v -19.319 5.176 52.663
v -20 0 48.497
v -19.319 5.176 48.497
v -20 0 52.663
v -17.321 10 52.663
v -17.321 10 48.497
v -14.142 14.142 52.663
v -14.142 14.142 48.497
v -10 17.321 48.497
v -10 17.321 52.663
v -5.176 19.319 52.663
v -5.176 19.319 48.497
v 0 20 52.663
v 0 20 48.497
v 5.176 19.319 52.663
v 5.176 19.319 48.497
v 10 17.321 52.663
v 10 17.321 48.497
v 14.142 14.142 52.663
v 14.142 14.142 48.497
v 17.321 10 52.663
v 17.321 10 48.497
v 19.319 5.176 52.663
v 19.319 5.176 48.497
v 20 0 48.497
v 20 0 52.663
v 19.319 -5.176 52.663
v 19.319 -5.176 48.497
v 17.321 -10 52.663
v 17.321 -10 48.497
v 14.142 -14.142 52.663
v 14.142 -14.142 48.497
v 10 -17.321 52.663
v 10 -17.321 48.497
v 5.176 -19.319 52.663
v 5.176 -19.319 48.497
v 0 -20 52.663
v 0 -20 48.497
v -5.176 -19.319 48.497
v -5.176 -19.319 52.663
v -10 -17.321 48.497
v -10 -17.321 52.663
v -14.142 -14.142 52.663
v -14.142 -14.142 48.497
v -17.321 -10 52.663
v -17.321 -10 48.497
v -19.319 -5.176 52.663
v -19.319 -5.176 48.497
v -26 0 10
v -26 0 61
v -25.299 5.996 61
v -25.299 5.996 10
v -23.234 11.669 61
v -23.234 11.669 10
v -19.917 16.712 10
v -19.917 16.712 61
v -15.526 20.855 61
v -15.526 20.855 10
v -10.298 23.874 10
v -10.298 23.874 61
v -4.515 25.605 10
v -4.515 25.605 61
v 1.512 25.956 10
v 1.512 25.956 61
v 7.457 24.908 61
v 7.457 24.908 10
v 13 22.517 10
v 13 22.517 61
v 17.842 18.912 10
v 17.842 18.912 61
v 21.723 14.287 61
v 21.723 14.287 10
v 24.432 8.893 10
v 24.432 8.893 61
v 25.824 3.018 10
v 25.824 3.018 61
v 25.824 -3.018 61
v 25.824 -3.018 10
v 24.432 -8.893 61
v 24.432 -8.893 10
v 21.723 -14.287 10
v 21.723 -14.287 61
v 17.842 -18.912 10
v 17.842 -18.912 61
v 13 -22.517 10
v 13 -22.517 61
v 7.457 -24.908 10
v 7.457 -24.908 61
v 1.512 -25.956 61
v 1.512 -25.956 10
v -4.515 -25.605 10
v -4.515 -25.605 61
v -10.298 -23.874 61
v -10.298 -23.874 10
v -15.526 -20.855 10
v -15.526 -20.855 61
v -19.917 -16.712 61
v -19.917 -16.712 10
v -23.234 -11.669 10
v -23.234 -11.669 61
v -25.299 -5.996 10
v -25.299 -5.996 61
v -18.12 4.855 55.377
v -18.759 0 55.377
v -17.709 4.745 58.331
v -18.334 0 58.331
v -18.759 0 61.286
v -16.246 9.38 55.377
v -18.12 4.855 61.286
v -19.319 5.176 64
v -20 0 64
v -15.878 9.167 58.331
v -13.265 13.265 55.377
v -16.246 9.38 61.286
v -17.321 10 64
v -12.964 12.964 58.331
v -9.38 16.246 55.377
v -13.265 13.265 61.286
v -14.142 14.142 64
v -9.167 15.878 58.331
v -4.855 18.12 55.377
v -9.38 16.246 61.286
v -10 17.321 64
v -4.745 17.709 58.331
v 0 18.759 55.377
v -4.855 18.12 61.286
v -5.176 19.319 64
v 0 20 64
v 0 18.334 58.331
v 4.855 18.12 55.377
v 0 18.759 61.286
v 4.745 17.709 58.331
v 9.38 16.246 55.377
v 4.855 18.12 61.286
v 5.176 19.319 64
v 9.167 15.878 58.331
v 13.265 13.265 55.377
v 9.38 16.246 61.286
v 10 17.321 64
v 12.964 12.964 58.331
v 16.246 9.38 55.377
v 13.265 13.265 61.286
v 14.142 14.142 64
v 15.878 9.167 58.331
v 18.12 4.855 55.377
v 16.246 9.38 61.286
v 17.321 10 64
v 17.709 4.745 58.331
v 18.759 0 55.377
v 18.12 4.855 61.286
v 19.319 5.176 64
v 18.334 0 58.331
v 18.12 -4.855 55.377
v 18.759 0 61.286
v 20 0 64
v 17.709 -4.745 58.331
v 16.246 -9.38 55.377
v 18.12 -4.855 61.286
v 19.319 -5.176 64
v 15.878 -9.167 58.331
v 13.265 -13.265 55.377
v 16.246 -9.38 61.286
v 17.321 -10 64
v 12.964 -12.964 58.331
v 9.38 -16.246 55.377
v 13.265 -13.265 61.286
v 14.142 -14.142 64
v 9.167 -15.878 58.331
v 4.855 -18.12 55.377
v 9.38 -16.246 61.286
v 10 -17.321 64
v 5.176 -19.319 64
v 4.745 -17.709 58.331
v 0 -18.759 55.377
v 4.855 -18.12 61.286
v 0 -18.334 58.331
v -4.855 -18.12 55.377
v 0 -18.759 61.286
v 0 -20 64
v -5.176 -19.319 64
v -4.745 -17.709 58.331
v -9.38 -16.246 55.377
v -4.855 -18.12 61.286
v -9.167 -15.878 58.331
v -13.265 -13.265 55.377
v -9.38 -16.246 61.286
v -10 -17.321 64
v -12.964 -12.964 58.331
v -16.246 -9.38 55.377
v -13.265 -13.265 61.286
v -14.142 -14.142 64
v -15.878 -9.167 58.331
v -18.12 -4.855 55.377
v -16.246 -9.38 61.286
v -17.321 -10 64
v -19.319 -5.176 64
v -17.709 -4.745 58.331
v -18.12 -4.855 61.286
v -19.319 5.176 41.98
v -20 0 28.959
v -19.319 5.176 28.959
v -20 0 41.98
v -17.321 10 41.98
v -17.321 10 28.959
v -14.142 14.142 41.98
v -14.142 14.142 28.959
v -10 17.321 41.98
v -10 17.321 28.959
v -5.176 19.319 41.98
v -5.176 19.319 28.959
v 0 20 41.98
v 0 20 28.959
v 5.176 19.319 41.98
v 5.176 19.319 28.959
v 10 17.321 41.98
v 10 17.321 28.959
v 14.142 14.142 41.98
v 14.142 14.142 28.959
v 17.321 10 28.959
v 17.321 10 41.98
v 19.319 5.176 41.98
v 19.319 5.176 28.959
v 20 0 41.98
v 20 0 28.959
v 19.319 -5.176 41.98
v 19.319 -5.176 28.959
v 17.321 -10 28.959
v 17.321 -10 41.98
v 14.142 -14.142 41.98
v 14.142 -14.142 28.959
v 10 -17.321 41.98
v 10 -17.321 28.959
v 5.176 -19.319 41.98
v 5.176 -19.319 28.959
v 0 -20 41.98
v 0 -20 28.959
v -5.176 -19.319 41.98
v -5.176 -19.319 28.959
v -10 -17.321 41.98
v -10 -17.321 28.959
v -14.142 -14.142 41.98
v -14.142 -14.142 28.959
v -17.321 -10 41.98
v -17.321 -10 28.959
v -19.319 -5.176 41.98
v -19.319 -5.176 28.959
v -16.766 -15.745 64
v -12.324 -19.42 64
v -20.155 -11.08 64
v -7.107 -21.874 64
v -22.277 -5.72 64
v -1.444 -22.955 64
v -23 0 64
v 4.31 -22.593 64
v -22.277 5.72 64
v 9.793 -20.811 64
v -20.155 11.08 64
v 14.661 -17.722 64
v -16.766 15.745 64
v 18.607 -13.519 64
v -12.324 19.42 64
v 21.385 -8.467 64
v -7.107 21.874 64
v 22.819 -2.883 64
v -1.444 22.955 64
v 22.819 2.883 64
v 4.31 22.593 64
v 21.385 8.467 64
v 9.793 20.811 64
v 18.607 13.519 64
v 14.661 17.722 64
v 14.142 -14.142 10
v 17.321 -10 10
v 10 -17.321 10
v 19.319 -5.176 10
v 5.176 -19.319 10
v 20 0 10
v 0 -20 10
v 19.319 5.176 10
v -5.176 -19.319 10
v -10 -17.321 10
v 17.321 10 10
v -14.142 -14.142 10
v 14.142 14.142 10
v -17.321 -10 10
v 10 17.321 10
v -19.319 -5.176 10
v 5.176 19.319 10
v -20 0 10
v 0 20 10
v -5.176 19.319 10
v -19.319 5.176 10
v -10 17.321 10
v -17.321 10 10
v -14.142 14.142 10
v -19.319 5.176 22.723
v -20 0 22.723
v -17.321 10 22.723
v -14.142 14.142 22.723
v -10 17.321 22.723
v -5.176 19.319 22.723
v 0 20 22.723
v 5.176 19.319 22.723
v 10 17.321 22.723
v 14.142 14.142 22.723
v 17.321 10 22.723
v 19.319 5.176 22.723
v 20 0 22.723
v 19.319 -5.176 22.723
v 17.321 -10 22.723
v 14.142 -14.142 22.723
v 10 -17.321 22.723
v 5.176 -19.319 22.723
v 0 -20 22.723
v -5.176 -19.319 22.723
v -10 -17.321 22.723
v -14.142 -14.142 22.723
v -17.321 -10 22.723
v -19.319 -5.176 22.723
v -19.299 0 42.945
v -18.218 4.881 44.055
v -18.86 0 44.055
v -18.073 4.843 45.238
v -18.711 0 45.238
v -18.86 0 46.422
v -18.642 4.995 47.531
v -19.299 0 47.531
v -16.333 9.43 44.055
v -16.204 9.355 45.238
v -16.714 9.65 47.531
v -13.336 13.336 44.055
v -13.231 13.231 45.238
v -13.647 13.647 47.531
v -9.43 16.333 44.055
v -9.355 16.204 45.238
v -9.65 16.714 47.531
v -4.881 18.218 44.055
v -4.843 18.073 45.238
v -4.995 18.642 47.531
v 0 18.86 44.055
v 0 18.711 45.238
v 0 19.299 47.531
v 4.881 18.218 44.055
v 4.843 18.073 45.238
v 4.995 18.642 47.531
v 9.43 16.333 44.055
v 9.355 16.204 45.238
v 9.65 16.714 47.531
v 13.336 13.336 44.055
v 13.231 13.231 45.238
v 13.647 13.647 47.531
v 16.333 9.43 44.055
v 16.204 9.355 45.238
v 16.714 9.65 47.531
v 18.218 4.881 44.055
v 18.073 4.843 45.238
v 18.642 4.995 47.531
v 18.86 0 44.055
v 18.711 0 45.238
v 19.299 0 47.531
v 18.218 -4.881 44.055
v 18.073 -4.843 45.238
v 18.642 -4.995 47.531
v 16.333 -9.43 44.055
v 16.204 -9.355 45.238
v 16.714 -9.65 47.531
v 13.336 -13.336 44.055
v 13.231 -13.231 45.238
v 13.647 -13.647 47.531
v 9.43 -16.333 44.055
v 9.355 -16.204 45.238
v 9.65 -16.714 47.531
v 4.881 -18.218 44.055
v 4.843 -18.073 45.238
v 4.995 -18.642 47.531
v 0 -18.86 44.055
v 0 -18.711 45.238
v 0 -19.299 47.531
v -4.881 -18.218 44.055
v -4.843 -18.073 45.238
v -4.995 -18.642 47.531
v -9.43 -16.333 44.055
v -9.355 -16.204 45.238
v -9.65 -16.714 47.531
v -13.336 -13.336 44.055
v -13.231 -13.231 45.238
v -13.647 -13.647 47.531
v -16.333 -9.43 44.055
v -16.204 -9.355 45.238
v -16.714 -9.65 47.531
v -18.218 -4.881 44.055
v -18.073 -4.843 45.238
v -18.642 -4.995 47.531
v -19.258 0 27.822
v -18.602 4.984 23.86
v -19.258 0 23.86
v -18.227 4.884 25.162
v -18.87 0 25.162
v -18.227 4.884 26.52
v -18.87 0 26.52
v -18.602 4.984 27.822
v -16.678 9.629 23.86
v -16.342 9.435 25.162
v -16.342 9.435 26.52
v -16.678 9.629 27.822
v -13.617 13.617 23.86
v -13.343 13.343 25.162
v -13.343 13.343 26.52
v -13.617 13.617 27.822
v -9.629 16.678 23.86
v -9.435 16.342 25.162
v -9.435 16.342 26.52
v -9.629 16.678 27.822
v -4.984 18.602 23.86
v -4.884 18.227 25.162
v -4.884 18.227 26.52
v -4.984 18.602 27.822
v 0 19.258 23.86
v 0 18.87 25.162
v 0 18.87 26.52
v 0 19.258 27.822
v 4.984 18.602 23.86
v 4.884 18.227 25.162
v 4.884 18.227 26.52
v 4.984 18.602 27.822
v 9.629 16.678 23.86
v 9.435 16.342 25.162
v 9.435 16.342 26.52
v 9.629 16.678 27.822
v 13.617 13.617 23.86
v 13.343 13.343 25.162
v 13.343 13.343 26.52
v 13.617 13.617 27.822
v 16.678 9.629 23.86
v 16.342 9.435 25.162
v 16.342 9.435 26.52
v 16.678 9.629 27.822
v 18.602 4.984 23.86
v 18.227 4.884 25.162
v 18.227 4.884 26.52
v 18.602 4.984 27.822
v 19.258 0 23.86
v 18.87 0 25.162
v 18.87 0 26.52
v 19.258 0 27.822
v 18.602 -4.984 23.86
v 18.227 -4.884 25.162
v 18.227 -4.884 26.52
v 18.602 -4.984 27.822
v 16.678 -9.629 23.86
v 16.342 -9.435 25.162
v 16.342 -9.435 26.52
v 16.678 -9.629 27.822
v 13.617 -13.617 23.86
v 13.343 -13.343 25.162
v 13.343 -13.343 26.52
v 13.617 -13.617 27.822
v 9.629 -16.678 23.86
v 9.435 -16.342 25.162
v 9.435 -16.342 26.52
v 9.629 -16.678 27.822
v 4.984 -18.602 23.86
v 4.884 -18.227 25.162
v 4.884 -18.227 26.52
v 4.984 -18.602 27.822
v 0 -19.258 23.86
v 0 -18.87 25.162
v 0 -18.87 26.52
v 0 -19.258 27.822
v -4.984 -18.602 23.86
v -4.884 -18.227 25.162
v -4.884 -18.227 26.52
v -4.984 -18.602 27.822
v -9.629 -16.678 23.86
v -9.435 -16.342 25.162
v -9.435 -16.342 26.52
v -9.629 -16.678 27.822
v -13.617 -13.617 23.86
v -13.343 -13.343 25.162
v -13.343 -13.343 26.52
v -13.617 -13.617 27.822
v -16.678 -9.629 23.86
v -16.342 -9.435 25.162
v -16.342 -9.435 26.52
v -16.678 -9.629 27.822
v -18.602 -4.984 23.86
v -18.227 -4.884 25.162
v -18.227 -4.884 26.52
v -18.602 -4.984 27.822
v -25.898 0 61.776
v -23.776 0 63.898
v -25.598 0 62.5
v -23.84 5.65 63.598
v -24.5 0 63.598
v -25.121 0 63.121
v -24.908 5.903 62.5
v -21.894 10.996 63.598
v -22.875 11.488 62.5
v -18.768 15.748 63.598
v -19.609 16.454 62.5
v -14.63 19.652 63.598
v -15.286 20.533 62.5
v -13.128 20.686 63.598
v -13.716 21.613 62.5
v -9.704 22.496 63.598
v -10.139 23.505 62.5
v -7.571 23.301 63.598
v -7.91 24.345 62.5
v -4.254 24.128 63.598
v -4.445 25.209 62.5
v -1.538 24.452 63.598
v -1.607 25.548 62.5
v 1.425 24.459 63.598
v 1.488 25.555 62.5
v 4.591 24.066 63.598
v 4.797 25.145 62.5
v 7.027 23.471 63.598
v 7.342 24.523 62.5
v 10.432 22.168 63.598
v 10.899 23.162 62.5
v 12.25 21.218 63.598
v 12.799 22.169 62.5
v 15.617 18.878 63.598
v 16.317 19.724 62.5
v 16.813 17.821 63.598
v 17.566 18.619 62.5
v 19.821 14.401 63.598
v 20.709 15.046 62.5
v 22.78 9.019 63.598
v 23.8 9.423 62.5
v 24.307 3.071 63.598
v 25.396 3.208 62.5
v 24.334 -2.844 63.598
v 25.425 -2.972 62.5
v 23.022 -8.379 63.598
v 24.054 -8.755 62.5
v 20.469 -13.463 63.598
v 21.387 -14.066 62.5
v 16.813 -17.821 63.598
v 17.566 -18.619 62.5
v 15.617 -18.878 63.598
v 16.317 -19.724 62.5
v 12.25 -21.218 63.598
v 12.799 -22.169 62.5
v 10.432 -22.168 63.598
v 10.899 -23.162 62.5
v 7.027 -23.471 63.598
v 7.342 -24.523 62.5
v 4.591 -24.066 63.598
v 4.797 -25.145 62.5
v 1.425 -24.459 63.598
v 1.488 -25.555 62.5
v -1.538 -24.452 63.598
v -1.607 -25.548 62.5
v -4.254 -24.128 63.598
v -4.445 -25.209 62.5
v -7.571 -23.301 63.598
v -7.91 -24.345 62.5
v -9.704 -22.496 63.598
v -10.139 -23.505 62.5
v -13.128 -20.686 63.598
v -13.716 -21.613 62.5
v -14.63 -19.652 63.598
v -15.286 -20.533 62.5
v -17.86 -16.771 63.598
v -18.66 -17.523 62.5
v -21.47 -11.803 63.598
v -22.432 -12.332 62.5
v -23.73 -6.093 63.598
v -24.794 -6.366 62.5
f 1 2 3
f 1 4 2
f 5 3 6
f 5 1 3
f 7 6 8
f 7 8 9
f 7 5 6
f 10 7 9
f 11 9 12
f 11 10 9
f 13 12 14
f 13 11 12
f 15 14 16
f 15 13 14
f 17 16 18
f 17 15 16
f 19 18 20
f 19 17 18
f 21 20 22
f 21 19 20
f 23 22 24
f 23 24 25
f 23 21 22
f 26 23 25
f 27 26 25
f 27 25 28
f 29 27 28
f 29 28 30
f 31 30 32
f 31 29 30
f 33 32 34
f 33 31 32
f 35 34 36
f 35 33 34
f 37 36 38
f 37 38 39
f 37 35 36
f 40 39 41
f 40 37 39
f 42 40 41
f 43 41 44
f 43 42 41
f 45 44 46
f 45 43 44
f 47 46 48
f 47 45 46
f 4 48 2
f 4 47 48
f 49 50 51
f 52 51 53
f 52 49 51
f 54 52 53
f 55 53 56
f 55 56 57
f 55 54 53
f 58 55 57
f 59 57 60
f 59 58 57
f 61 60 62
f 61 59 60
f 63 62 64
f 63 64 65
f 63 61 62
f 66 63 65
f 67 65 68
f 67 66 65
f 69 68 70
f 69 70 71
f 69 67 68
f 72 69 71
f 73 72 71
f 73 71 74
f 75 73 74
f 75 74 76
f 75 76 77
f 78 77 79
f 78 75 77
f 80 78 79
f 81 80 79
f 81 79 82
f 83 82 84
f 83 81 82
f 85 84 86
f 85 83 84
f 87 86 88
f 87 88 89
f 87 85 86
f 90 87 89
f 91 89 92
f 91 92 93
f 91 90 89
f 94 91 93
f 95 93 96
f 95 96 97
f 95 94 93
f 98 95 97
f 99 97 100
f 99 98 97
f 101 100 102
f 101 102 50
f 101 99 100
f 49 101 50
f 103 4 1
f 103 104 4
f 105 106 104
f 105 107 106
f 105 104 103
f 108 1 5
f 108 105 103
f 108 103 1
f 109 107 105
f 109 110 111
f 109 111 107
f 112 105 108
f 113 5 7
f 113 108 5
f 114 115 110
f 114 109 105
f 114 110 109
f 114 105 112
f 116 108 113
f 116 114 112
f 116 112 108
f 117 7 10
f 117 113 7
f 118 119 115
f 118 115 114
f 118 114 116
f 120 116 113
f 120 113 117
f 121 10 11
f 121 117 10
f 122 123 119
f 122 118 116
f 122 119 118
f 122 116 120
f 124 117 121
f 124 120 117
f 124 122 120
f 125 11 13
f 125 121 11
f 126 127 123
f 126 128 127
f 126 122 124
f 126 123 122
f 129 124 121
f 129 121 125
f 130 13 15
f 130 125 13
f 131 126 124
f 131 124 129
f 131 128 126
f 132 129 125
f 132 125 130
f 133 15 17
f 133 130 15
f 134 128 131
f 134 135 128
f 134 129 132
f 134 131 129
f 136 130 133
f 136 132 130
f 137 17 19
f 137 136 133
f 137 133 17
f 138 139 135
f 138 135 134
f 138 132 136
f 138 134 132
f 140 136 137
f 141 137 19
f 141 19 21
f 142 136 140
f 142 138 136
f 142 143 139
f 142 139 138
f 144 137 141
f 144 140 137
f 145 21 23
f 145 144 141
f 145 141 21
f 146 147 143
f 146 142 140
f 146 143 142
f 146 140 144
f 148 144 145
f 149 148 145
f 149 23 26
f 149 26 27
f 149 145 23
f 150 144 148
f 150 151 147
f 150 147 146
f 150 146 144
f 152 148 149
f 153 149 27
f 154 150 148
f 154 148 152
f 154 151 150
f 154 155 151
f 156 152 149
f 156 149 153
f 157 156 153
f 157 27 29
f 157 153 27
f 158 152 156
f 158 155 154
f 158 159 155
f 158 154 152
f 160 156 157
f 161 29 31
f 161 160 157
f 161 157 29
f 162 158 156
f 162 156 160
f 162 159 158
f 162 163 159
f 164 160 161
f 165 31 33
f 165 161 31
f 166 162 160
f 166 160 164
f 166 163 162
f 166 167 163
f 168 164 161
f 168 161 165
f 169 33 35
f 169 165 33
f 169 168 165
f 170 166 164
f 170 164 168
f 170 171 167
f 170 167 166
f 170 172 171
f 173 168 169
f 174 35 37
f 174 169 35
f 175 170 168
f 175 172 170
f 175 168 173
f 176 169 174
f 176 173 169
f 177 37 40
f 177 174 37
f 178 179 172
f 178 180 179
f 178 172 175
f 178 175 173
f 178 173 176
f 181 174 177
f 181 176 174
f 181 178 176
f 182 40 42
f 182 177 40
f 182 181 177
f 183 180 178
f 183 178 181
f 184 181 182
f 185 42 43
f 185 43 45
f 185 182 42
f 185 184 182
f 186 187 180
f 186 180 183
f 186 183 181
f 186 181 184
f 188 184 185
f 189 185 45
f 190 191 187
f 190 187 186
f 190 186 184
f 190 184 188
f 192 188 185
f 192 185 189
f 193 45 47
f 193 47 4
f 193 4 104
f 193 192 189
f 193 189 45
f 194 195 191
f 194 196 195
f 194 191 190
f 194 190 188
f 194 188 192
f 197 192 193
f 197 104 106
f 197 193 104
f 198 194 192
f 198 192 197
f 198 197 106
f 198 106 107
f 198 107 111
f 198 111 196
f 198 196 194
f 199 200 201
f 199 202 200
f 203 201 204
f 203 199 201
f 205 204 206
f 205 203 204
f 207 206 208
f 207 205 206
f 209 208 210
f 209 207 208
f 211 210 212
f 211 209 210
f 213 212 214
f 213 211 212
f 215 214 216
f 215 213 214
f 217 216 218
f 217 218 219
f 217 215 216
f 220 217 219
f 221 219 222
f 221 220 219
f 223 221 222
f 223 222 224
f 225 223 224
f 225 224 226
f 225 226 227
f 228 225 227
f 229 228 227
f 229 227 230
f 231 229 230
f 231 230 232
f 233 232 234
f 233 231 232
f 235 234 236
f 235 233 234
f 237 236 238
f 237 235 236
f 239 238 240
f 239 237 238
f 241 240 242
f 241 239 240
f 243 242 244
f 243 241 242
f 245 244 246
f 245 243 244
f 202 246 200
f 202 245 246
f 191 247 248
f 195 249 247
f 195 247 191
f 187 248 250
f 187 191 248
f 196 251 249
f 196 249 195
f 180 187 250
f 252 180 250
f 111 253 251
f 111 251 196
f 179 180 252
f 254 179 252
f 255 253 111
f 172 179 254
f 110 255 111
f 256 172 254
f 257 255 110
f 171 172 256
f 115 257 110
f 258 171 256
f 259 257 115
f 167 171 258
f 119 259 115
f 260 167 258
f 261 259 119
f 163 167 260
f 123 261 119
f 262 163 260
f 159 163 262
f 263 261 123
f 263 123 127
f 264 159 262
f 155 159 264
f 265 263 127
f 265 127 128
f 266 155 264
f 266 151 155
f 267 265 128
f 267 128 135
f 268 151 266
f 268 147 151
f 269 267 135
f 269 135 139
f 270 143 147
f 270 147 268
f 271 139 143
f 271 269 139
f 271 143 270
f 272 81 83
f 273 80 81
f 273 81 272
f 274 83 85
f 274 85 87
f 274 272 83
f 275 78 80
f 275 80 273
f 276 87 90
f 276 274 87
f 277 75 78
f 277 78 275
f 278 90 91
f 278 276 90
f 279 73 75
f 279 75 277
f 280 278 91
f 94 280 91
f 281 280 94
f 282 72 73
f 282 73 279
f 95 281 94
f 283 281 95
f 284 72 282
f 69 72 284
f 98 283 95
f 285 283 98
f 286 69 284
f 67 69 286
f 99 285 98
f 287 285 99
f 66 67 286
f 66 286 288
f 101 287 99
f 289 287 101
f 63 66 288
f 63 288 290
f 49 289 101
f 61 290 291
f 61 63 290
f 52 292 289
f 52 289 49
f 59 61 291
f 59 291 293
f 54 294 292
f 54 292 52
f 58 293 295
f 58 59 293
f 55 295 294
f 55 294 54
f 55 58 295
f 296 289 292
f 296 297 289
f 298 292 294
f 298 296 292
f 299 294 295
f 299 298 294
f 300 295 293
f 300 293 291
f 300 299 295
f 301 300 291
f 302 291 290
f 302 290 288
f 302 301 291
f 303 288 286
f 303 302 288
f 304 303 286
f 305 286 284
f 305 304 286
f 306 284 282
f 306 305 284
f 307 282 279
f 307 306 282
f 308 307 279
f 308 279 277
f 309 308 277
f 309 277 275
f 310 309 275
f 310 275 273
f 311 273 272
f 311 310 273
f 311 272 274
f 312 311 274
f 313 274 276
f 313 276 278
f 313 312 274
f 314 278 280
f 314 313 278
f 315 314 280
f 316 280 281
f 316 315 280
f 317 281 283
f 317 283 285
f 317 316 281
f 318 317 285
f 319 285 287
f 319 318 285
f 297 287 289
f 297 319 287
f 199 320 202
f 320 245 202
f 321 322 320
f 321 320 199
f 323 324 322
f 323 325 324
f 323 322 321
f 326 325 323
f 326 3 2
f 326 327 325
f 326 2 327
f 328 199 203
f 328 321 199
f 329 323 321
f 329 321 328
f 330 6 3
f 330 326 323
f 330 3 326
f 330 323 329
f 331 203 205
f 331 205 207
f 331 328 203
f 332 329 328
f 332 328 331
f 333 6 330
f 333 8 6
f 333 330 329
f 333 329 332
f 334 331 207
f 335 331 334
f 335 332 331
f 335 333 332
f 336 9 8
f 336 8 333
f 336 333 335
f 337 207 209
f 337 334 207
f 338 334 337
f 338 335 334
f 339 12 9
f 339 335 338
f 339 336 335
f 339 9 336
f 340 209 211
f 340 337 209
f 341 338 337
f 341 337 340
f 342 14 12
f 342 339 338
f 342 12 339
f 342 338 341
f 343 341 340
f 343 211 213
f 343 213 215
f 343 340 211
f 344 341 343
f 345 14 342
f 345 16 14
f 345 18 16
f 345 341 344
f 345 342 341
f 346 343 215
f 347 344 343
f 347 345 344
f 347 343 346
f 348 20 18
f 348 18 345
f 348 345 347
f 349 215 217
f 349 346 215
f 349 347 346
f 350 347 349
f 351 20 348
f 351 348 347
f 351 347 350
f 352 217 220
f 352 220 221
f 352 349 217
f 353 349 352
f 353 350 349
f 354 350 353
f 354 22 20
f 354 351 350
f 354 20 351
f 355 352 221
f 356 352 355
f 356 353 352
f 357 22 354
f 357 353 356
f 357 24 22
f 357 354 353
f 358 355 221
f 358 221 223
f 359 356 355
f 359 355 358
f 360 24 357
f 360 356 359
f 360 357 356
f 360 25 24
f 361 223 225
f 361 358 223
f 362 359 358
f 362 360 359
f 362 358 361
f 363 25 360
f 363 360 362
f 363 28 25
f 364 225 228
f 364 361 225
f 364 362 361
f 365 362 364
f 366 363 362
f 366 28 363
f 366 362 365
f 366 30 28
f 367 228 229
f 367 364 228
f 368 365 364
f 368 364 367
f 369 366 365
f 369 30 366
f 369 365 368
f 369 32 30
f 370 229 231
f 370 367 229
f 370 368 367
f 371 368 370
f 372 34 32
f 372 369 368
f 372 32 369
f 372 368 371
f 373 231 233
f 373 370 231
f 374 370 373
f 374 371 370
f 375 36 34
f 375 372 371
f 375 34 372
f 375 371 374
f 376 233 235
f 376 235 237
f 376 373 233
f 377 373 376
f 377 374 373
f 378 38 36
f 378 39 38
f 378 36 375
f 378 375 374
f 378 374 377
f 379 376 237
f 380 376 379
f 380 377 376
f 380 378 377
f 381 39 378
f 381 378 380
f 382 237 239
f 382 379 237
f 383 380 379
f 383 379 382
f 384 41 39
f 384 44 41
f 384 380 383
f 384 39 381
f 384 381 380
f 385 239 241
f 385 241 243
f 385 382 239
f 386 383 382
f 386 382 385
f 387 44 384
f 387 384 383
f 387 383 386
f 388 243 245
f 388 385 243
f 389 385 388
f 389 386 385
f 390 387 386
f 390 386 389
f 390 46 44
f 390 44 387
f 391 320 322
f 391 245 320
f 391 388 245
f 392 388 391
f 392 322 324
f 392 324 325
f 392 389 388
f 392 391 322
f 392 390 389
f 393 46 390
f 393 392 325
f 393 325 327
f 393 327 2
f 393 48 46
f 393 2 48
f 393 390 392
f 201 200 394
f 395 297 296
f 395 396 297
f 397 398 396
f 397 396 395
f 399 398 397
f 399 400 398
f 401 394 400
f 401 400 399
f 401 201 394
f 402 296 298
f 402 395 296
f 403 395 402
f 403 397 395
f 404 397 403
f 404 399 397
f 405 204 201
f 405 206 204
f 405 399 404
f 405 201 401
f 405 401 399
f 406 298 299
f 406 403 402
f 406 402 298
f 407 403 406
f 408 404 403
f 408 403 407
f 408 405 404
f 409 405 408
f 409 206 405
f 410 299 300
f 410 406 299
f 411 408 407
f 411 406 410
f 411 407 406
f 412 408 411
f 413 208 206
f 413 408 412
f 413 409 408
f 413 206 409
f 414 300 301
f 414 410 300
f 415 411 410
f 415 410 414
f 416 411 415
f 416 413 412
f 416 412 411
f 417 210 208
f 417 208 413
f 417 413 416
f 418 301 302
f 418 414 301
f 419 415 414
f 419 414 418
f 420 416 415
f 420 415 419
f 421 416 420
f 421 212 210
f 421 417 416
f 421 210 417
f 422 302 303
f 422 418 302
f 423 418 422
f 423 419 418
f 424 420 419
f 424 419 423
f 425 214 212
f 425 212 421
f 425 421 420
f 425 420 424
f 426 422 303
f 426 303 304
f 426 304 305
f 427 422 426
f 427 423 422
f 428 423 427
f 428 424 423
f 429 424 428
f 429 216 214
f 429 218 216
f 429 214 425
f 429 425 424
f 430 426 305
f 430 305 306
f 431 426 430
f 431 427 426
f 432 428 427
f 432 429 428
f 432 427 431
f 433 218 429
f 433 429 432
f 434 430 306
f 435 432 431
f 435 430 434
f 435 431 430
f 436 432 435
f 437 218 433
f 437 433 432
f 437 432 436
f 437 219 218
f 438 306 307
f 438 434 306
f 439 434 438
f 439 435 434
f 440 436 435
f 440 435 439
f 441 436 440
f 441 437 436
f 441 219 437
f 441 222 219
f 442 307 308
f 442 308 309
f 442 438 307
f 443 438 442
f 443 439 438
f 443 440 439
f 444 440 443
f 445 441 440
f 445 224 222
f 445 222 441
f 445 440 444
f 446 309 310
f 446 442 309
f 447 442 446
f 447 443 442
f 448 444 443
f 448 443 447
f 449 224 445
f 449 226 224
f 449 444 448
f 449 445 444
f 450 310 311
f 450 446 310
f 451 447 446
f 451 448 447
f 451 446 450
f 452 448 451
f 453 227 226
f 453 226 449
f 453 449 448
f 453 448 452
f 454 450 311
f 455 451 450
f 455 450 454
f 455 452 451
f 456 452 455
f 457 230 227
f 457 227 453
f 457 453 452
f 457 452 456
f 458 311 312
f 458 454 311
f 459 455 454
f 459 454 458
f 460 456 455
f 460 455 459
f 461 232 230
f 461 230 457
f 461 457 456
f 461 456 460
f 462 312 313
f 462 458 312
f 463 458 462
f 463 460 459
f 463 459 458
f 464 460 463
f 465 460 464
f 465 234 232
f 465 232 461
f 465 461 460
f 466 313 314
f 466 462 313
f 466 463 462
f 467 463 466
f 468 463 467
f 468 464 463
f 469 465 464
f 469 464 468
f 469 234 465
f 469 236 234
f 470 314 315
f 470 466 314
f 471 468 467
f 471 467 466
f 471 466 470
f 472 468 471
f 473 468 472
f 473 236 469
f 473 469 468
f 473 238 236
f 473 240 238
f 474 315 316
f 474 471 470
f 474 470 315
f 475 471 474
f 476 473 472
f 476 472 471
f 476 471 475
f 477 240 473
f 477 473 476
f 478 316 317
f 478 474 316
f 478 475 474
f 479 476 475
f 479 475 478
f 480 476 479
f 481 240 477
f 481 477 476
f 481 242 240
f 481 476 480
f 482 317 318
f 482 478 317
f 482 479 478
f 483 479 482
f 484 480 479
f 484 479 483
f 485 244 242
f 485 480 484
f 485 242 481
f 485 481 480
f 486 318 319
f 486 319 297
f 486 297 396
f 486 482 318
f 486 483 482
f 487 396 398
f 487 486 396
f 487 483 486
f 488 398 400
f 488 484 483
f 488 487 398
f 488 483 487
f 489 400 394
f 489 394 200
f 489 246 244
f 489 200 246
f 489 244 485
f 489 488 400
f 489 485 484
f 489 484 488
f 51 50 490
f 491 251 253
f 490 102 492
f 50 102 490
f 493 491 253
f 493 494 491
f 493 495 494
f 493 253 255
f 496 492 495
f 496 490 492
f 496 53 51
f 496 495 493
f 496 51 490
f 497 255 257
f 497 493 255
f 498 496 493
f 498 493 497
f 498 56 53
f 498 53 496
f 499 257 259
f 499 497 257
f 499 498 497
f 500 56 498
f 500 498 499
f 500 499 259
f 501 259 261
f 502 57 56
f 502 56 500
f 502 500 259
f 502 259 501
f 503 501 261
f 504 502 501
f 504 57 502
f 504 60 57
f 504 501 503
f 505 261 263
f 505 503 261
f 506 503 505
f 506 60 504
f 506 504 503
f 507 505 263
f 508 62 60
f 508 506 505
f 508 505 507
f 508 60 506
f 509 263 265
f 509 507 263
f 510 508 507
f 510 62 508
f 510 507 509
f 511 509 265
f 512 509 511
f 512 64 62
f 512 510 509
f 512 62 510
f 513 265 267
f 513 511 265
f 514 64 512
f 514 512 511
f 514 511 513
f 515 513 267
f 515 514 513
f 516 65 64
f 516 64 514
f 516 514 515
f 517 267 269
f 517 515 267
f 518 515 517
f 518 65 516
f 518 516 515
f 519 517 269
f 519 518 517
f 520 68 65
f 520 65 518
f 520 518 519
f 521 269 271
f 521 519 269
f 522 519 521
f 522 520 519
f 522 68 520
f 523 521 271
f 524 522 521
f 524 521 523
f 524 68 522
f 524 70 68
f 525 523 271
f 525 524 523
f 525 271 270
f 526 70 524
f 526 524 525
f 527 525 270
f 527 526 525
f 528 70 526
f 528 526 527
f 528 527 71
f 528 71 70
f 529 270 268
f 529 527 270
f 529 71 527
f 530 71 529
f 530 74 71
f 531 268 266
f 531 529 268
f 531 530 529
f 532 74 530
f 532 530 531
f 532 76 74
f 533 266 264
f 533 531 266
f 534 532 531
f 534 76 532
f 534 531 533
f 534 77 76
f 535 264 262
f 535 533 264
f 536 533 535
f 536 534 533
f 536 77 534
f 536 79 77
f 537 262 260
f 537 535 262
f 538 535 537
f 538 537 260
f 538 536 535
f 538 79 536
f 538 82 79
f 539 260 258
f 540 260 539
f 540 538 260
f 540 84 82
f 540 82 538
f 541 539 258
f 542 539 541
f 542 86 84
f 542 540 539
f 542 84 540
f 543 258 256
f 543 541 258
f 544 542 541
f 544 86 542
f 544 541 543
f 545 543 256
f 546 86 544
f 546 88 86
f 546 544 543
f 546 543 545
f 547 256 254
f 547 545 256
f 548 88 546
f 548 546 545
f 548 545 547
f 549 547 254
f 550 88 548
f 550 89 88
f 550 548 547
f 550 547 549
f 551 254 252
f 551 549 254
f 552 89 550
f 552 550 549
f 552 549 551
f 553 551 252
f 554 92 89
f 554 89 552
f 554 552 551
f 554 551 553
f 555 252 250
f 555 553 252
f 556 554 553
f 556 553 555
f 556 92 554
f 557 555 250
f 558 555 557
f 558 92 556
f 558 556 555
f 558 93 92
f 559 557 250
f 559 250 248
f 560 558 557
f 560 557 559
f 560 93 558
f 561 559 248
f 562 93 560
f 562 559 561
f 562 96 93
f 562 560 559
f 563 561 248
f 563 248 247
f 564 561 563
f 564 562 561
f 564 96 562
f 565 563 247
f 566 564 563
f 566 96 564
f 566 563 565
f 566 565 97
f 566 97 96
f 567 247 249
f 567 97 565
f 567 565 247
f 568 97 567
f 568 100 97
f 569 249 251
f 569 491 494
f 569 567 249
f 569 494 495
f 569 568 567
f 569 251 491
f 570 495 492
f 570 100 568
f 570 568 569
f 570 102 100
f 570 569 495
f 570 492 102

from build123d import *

# Parameters (mm, degrees)
F2_R = 3


with BuildPart() as f1:
    # F0 (on Front) → F1 (revolve)
    with BuildSketch(Plane.XZ):
        with BuildLine():
            ThreePointArc((-20, 52.662842), (-18.333853, 58.331421), (-20, 64))
            Line((-20, 64), (-26, 64))
            Line((-26, 64), (-26, 10))
            Line((-26, 10), (-20, 10))
            Line((-20, 10), (-20, 22.722758))
            ThreePointArc((-20, 22.722758), (-18.82131, 25.840918), (-20, 28.959077))
            Line((-20, 28.959077), (-20, 41.979928))
            ThreePointArc((-20, 41.979928), (-18.710805, 45.238344), (-20, 48.49676))
            Line((-20, 48.49676), (-20, 52.662842))
        make_face()
    revolve(axis=Axis((0, 0, 15.521475), (0, 0, -1)))

    # F2
    f2_edges = [f1.edges().sort_by_distance(p)[0] for p in [
        (26, 0, 64),
    ]]
    fillet(f2_edges, radius=F2_R)


solid = f1.part
